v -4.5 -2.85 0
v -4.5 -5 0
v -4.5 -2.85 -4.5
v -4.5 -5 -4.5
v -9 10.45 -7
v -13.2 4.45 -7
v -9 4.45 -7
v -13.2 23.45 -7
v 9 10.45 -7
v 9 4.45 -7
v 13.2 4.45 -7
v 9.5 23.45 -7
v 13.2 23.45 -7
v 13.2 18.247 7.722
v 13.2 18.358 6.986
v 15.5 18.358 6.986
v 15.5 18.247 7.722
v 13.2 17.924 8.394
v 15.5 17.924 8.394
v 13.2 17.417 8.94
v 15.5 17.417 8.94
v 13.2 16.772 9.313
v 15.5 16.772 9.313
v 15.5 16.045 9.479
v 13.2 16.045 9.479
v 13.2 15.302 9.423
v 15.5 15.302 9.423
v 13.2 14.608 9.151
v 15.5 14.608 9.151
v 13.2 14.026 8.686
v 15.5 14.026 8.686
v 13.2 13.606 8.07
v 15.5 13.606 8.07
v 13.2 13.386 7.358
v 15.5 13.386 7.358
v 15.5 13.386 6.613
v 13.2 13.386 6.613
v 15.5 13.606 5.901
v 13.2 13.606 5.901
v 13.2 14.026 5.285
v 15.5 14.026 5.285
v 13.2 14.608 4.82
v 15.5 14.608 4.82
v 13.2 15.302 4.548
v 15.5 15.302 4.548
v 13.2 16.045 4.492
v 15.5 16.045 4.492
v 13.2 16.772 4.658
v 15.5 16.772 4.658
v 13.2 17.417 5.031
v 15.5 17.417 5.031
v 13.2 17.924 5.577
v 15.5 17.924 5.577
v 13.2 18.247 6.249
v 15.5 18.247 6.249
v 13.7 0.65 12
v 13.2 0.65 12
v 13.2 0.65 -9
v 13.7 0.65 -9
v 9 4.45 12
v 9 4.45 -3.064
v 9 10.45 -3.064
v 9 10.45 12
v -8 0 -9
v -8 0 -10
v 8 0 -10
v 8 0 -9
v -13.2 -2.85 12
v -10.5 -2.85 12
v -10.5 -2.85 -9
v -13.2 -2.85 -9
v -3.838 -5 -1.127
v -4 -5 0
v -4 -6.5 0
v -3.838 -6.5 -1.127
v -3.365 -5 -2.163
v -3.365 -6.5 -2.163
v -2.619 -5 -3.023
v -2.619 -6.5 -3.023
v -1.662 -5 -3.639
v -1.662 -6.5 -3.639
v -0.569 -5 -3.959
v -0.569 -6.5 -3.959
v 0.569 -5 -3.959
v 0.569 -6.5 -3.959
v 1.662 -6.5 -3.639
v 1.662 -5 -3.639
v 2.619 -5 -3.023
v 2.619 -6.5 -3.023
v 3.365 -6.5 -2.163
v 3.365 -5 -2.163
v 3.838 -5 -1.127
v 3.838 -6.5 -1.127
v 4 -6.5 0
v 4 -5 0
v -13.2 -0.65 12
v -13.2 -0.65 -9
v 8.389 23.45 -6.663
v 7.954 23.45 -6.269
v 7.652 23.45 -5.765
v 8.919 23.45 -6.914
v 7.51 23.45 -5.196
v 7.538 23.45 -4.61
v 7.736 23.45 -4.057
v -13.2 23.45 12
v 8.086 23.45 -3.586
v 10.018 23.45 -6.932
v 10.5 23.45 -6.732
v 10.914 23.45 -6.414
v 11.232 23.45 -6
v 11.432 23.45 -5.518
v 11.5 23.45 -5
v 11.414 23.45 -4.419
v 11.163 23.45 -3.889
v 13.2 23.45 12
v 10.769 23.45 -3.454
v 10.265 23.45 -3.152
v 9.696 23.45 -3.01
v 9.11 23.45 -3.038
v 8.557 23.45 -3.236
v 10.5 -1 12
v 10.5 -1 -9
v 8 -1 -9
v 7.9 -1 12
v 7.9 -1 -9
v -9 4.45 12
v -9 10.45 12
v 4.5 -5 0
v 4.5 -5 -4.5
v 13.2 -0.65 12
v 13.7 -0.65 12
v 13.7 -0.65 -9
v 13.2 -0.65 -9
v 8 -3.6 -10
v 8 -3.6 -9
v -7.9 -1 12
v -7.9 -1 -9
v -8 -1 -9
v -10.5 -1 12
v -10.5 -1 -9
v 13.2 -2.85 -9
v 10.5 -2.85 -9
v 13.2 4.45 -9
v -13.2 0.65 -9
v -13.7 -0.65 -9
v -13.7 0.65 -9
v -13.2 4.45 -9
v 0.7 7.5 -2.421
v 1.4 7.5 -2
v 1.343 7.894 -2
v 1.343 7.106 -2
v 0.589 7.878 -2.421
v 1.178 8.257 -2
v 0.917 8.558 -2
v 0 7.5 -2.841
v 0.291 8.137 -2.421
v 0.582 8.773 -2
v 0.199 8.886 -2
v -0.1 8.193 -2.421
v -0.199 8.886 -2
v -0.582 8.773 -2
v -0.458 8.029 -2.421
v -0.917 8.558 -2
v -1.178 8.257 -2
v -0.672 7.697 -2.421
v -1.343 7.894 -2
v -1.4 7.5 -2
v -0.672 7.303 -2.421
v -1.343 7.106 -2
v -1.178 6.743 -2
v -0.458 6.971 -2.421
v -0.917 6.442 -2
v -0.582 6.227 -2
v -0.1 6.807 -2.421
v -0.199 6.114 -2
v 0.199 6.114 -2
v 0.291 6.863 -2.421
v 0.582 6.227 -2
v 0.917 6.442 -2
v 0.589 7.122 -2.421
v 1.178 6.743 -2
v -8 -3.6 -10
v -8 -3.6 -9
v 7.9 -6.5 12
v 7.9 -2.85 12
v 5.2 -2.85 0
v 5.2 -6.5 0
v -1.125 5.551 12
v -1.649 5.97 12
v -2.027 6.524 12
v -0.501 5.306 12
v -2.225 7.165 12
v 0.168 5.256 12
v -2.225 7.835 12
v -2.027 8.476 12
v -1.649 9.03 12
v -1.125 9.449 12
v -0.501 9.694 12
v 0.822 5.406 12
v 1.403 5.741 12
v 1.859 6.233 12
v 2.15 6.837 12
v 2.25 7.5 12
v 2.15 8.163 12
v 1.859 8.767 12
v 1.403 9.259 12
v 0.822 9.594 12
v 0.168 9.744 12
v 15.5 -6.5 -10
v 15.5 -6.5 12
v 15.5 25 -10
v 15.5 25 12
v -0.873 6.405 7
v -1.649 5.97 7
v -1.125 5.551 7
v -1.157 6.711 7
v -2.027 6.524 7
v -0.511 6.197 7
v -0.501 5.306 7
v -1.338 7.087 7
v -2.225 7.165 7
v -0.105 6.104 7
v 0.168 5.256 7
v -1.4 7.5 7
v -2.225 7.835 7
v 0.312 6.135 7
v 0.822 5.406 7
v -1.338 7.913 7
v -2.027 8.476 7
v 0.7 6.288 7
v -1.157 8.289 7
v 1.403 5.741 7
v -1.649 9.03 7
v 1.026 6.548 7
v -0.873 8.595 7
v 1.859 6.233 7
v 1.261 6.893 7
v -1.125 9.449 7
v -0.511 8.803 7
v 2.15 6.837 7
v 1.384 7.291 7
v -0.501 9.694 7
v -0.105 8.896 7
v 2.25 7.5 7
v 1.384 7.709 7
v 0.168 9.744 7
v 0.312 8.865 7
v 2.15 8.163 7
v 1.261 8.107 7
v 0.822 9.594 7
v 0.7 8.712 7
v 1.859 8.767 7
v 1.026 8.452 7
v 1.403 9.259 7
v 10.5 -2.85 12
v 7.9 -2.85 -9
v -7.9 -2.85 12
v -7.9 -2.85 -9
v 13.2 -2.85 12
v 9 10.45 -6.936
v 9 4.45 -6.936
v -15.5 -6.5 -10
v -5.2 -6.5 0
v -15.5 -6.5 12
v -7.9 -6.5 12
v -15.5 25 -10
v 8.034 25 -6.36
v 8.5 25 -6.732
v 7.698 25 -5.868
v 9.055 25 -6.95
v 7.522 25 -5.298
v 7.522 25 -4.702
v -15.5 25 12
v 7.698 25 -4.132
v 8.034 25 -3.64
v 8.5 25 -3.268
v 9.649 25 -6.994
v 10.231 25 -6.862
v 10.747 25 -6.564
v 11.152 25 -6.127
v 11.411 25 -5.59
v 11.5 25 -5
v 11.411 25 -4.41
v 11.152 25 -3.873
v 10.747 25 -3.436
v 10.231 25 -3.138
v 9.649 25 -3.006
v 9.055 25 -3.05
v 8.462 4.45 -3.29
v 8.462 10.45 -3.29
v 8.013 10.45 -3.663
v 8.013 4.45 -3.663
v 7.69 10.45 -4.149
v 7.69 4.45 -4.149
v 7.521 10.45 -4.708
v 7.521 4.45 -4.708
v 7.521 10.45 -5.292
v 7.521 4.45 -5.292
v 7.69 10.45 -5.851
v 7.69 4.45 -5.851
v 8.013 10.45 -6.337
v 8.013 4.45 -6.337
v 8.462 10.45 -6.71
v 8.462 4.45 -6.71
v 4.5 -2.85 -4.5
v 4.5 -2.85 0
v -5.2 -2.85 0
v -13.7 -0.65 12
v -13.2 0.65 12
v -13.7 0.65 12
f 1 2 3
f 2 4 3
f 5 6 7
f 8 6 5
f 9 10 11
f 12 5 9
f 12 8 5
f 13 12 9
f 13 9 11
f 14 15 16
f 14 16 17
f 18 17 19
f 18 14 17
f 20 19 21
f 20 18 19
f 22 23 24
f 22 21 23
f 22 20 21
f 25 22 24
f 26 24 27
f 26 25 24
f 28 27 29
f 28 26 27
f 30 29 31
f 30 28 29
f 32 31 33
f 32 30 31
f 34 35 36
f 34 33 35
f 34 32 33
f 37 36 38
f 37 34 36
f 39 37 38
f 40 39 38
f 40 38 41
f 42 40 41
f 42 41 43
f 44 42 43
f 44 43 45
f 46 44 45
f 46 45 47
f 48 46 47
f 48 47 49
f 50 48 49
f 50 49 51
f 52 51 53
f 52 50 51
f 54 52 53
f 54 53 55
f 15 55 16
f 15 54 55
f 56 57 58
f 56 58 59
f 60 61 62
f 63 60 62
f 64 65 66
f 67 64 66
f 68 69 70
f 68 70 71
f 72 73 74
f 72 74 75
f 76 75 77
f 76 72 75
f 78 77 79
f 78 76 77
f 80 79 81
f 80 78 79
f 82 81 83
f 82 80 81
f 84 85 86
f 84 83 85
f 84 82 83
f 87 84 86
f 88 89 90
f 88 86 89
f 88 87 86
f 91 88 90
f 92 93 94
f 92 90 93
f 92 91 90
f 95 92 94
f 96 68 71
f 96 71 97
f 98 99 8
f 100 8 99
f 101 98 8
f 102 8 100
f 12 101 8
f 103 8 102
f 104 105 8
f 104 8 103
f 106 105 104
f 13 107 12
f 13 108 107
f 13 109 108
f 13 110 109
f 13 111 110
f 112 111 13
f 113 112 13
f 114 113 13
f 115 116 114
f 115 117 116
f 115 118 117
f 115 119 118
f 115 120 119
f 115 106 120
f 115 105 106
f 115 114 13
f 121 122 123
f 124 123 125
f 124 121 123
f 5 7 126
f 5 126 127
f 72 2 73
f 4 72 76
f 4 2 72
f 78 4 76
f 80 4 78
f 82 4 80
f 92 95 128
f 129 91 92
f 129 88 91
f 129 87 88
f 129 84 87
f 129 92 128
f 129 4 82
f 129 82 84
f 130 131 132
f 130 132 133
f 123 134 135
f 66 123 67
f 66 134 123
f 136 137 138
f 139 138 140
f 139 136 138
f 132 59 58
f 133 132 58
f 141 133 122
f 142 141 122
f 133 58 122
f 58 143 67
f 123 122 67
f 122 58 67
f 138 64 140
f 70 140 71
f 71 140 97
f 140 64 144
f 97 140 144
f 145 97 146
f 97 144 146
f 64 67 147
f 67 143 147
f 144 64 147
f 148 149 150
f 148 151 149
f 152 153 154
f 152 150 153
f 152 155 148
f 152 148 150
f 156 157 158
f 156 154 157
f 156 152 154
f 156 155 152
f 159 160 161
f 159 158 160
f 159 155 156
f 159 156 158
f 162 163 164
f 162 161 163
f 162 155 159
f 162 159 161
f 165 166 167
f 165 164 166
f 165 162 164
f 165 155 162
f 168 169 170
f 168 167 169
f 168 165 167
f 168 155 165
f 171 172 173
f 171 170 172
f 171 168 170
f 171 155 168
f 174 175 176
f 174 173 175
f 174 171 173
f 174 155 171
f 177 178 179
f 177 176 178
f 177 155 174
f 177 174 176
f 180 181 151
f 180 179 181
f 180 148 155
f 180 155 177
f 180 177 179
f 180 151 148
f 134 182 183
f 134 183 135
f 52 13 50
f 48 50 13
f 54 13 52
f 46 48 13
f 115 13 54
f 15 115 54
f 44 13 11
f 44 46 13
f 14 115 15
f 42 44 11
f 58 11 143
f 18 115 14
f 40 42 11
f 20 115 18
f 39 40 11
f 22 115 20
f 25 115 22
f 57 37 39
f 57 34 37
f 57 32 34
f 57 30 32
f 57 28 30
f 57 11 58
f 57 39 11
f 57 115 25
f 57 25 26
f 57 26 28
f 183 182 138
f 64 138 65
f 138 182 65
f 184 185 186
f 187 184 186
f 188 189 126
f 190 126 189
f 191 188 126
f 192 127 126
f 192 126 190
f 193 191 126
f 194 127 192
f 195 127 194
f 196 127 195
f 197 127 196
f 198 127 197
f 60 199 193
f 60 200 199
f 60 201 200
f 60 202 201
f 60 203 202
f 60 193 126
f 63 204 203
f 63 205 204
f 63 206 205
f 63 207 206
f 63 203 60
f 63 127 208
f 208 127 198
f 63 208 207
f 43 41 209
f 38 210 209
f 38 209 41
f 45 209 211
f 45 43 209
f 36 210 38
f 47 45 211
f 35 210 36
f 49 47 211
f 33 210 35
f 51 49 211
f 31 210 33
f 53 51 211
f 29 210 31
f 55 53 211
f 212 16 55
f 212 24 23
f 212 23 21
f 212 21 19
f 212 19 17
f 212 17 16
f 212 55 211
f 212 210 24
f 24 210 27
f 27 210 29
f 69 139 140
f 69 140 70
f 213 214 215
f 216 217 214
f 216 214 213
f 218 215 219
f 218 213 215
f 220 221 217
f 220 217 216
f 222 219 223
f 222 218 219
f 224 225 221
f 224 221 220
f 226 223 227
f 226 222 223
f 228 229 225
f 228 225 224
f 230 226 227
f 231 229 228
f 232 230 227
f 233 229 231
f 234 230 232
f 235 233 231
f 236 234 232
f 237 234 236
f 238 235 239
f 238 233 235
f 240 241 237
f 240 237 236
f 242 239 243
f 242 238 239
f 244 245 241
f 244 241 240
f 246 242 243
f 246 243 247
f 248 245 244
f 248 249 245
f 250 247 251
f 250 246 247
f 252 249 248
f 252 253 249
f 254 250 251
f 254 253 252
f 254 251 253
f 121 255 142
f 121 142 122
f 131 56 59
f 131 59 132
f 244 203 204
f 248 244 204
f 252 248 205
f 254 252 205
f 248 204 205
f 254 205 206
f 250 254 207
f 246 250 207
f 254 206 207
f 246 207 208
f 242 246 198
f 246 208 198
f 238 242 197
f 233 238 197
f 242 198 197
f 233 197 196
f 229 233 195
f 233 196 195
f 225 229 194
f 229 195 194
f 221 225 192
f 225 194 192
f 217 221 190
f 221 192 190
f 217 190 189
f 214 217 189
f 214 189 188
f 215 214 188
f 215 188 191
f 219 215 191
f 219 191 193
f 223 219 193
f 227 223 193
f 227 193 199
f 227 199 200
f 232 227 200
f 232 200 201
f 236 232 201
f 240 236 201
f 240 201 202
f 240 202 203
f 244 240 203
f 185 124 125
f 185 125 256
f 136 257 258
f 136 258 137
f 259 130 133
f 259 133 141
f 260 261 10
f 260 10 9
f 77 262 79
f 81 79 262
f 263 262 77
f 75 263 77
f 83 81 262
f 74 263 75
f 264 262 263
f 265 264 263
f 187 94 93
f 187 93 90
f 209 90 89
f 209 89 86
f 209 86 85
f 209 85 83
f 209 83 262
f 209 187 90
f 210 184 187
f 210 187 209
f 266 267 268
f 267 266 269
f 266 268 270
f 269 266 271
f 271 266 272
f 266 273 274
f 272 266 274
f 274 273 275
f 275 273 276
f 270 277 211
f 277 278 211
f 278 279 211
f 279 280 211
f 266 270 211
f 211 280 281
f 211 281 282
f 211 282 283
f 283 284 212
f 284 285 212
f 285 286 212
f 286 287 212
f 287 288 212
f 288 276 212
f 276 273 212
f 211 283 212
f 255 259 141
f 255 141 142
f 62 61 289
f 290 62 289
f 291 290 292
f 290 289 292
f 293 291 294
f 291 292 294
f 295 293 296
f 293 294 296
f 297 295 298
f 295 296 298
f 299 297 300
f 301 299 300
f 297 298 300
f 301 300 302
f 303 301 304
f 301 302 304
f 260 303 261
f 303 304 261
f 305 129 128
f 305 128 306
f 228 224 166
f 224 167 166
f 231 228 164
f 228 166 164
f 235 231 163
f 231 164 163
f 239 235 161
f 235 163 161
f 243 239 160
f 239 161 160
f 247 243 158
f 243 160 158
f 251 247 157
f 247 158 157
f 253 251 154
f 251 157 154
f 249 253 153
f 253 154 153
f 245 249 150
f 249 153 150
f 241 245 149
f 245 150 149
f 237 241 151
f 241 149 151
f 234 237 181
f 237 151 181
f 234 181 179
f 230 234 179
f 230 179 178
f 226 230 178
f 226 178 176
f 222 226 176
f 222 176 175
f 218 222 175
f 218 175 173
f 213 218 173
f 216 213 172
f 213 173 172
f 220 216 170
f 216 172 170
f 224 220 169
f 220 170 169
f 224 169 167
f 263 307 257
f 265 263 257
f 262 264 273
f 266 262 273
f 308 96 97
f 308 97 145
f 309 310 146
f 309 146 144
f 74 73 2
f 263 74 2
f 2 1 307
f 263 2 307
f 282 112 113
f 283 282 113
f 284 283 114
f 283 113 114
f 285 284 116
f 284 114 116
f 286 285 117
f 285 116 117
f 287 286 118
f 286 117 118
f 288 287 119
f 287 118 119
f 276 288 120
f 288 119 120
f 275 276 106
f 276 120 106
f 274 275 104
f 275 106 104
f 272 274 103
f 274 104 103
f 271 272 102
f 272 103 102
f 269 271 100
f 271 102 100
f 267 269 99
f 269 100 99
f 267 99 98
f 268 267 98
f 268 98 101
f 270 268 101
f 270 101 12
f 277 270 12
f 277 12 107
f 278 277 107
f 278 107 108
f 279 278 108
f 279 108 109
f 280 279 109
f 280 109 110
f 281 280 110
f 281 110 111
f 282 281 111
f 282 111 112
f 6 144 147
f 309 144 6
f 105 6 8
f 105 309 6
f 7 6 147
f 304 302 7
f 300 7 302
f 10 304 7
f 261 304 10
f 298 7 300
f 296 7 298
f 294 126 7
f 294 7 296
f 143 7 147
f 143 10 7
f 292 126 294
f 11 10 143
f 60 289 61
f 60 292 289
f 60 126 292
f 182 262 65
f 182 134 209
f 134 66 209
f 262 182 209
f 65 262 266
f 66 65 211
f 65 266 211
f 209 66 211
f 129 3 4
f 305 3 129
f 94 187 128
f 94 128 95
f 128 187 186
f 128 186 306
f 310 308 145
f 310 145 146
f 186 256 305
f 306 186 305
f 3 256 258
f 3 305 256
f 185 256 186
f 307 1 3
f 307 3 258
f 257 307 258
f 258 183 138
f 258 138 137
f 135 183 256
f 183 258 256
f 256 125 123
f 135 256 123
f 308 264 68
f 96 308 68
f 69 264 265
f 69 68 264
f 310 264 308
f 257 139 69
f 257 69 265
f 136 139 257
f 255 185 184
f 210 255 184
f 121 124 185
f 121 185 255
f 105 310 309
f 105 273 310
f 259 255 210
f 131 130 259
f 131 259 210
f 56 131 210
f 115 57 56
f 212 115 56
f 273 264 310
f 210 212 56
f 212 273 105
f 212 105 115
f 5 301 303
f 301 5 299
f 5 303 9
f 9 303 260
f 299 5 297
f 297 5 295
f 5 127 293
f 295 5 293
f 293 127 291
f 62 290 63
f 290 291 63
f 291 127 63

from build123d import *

# Parameters (mm, degrees)
SKETCH_W             = 31
SKETCH_H             = 31.5
PAD_DEPTH            = 12
PAD_DEPTH_BACK       = 10
POCKET_DEPTH         = 21
SKETCH002_W          = 26.4
SKETCH002_H          = 22.8
SKETCH002_W_2        = 18
SKETCH002_H_2        = 6
POCKET001_DEPTH      = 19
SKETCH003_W          = 9
SKETCH003_H          = 5
POCKET002_DEPTH      = 4.5
POCKET002_DEPTH_BACK = 15
POCKET003_DEPTH      = 6.501
SKETCH005_W          = 16
SKETCH005_H          = 3.6
POCKET004_DEPTH      = 1
SKETCH006_R          = 2
POCKET005_DEPTH      = 25.001
HOLE_D               = 2.8
HOLE_DEPTH           = 14
HOLE_CBORE_D         = 4.5
HOLE_CBORE_DEPTH     = 5
HOLE_TIPS_R          = 1.4
SKETCH008_R          = 2.5
POCKET006_DEPTH      = 15.501


with BuildPart() as part:
    # Sketch → Pad (new body, two sides)
    with BuildSketch(Plane.XY) as pad_sk:
        with Locations((0, 9.25)):
            Rectangle(SKETCH_W, SKETCH_H)
    extrude(amount=PAD_DEPTH)
    extrude(pad_sk.sketch, amount=-PAD_DEPTH_BACK)

    # Sketch001 → Pocket (cut)
    with BuildSketch(Plane.XY.offset(12)):
        Polygon((-7.9, -2.85), (-7.9, -1), (-10.5, -1), (-10.5, -2.85), (-13.2, -2.85), (-13.2, -0.65), (-13.7, -0.65), (-13.7, 0.65), (-13.2, 0.65), (-13.2, 4.45), (13.2, 4.45), (13.2, 0.65), (13.7, 0.65), (13.7, -0.65), (13.2, -0.65), (13.2, -2.85), (10.5, -2.85), (10.5, -1), (7.9, -1), (7.9, -2.85), align=None)
    extrude(amount=-POCKET_DEPTH, mode=Mode.SUBTRACT)

    # Sketch002 → Pocket001 (cut)
    with BuildSketch(Plane.XY.offset(12)):
        with Locations((0, 12.05)):
            Rectangle(SKETCH002_W, SKETCH002_H)
        with Locations((0, 7.45)):
            Rectangle(SKETCH002_W_2, SKETCH002_H_2, mode=Mode.SUBTRACT)
    extrude(amount=-POCKET001_DEPTH, mode=Mode.SUBTRACT)

    # Sketch003 → Pocket002 (cut, two sides)
    with BuildSketch(Plane.XY) as pocket002_sk:
        with Locations((0, -2.5)):
            Rectangle(SKETCH003_W, SKETCH003_H)
    extrude(amount=-POCKET002_DEPTH, mode=Mode.SUBTRACT)
    extrude(pocket002_sk.sketch, amount=POCKET002_DEPTH_BACK, mode=Mode.SUBTRACT)

    # Sketch004 → Pocket003 (cut, through all)
    with BuildSketch(Plane.XZ):
        with BuildLine():
            ThreePointArc((-4, 0), (0, -4), (4, 0))
            Line((5.2, 0), (4, 0))
            Line((7.9, 12), (5.2, 0))
            Line((-7.9, 12), (7.9, 12))
            Line((-5.2, 0), (-7.9, 12))
            Line((-4, 0), (-5.2, 0))
        make_face()
    extrude(amount=POCKET003_DEPTH, mode=Mode.SUBTRACT)

    # Sketch005 → Pocket004 (cut)
    with BuildSketch(Plane.XY.offset(-10)):
        with Locations((0, -1.8)):
            Rectangle(SKETCH005_W, SKETCH005_H)
    extrude(amount=POCKET004_DEPTH, mode=Mode.SUBTRACT)

    # Sketch006 → Pocket005 (cut, through all)
    with BuildSketch(Plane.XZ):
        with Locations((9.5, -5)):
            Circle(SKETCH006_R)
    extrude(amount=-POCKET005_DEPTH, mode=Mode.SUBTRACT)

    # Hole
    with Locations(Plane.XY.offset(12)):
        with Locations((0, 7.5)):
            CounterBoreHole(HOLE_D / 2, HOLE_CBORE_D / 2, HOLE_CBORE_DEPTH, depth=HOLE_DEPTH)

    # Hole tips → Hole tip 1 section 0
    with BuildSketch(Plane.XY.offset(-2), mode=Mode.PRIVATE) as hole_tip_1_s0:
        with Locations((0, 7.5)):
            Circle(HOLE_TIPS_R)
    loft([hole_tip_1_s0.sketch, Vertex(0, 7.5, -2.841205)], mode=Mode.SUBTRACT)

    # Sketch008 → Pocket006 (cut, through all)
    with BuildSketch(Plane.YZ):
        with Locations((15.858465, 6.985507)):
            Circle(SKETCH008_R)
    extrude(amount=POCKET006_DEPTH, mode=Mode.SUBTRACT)


solid = part.part
